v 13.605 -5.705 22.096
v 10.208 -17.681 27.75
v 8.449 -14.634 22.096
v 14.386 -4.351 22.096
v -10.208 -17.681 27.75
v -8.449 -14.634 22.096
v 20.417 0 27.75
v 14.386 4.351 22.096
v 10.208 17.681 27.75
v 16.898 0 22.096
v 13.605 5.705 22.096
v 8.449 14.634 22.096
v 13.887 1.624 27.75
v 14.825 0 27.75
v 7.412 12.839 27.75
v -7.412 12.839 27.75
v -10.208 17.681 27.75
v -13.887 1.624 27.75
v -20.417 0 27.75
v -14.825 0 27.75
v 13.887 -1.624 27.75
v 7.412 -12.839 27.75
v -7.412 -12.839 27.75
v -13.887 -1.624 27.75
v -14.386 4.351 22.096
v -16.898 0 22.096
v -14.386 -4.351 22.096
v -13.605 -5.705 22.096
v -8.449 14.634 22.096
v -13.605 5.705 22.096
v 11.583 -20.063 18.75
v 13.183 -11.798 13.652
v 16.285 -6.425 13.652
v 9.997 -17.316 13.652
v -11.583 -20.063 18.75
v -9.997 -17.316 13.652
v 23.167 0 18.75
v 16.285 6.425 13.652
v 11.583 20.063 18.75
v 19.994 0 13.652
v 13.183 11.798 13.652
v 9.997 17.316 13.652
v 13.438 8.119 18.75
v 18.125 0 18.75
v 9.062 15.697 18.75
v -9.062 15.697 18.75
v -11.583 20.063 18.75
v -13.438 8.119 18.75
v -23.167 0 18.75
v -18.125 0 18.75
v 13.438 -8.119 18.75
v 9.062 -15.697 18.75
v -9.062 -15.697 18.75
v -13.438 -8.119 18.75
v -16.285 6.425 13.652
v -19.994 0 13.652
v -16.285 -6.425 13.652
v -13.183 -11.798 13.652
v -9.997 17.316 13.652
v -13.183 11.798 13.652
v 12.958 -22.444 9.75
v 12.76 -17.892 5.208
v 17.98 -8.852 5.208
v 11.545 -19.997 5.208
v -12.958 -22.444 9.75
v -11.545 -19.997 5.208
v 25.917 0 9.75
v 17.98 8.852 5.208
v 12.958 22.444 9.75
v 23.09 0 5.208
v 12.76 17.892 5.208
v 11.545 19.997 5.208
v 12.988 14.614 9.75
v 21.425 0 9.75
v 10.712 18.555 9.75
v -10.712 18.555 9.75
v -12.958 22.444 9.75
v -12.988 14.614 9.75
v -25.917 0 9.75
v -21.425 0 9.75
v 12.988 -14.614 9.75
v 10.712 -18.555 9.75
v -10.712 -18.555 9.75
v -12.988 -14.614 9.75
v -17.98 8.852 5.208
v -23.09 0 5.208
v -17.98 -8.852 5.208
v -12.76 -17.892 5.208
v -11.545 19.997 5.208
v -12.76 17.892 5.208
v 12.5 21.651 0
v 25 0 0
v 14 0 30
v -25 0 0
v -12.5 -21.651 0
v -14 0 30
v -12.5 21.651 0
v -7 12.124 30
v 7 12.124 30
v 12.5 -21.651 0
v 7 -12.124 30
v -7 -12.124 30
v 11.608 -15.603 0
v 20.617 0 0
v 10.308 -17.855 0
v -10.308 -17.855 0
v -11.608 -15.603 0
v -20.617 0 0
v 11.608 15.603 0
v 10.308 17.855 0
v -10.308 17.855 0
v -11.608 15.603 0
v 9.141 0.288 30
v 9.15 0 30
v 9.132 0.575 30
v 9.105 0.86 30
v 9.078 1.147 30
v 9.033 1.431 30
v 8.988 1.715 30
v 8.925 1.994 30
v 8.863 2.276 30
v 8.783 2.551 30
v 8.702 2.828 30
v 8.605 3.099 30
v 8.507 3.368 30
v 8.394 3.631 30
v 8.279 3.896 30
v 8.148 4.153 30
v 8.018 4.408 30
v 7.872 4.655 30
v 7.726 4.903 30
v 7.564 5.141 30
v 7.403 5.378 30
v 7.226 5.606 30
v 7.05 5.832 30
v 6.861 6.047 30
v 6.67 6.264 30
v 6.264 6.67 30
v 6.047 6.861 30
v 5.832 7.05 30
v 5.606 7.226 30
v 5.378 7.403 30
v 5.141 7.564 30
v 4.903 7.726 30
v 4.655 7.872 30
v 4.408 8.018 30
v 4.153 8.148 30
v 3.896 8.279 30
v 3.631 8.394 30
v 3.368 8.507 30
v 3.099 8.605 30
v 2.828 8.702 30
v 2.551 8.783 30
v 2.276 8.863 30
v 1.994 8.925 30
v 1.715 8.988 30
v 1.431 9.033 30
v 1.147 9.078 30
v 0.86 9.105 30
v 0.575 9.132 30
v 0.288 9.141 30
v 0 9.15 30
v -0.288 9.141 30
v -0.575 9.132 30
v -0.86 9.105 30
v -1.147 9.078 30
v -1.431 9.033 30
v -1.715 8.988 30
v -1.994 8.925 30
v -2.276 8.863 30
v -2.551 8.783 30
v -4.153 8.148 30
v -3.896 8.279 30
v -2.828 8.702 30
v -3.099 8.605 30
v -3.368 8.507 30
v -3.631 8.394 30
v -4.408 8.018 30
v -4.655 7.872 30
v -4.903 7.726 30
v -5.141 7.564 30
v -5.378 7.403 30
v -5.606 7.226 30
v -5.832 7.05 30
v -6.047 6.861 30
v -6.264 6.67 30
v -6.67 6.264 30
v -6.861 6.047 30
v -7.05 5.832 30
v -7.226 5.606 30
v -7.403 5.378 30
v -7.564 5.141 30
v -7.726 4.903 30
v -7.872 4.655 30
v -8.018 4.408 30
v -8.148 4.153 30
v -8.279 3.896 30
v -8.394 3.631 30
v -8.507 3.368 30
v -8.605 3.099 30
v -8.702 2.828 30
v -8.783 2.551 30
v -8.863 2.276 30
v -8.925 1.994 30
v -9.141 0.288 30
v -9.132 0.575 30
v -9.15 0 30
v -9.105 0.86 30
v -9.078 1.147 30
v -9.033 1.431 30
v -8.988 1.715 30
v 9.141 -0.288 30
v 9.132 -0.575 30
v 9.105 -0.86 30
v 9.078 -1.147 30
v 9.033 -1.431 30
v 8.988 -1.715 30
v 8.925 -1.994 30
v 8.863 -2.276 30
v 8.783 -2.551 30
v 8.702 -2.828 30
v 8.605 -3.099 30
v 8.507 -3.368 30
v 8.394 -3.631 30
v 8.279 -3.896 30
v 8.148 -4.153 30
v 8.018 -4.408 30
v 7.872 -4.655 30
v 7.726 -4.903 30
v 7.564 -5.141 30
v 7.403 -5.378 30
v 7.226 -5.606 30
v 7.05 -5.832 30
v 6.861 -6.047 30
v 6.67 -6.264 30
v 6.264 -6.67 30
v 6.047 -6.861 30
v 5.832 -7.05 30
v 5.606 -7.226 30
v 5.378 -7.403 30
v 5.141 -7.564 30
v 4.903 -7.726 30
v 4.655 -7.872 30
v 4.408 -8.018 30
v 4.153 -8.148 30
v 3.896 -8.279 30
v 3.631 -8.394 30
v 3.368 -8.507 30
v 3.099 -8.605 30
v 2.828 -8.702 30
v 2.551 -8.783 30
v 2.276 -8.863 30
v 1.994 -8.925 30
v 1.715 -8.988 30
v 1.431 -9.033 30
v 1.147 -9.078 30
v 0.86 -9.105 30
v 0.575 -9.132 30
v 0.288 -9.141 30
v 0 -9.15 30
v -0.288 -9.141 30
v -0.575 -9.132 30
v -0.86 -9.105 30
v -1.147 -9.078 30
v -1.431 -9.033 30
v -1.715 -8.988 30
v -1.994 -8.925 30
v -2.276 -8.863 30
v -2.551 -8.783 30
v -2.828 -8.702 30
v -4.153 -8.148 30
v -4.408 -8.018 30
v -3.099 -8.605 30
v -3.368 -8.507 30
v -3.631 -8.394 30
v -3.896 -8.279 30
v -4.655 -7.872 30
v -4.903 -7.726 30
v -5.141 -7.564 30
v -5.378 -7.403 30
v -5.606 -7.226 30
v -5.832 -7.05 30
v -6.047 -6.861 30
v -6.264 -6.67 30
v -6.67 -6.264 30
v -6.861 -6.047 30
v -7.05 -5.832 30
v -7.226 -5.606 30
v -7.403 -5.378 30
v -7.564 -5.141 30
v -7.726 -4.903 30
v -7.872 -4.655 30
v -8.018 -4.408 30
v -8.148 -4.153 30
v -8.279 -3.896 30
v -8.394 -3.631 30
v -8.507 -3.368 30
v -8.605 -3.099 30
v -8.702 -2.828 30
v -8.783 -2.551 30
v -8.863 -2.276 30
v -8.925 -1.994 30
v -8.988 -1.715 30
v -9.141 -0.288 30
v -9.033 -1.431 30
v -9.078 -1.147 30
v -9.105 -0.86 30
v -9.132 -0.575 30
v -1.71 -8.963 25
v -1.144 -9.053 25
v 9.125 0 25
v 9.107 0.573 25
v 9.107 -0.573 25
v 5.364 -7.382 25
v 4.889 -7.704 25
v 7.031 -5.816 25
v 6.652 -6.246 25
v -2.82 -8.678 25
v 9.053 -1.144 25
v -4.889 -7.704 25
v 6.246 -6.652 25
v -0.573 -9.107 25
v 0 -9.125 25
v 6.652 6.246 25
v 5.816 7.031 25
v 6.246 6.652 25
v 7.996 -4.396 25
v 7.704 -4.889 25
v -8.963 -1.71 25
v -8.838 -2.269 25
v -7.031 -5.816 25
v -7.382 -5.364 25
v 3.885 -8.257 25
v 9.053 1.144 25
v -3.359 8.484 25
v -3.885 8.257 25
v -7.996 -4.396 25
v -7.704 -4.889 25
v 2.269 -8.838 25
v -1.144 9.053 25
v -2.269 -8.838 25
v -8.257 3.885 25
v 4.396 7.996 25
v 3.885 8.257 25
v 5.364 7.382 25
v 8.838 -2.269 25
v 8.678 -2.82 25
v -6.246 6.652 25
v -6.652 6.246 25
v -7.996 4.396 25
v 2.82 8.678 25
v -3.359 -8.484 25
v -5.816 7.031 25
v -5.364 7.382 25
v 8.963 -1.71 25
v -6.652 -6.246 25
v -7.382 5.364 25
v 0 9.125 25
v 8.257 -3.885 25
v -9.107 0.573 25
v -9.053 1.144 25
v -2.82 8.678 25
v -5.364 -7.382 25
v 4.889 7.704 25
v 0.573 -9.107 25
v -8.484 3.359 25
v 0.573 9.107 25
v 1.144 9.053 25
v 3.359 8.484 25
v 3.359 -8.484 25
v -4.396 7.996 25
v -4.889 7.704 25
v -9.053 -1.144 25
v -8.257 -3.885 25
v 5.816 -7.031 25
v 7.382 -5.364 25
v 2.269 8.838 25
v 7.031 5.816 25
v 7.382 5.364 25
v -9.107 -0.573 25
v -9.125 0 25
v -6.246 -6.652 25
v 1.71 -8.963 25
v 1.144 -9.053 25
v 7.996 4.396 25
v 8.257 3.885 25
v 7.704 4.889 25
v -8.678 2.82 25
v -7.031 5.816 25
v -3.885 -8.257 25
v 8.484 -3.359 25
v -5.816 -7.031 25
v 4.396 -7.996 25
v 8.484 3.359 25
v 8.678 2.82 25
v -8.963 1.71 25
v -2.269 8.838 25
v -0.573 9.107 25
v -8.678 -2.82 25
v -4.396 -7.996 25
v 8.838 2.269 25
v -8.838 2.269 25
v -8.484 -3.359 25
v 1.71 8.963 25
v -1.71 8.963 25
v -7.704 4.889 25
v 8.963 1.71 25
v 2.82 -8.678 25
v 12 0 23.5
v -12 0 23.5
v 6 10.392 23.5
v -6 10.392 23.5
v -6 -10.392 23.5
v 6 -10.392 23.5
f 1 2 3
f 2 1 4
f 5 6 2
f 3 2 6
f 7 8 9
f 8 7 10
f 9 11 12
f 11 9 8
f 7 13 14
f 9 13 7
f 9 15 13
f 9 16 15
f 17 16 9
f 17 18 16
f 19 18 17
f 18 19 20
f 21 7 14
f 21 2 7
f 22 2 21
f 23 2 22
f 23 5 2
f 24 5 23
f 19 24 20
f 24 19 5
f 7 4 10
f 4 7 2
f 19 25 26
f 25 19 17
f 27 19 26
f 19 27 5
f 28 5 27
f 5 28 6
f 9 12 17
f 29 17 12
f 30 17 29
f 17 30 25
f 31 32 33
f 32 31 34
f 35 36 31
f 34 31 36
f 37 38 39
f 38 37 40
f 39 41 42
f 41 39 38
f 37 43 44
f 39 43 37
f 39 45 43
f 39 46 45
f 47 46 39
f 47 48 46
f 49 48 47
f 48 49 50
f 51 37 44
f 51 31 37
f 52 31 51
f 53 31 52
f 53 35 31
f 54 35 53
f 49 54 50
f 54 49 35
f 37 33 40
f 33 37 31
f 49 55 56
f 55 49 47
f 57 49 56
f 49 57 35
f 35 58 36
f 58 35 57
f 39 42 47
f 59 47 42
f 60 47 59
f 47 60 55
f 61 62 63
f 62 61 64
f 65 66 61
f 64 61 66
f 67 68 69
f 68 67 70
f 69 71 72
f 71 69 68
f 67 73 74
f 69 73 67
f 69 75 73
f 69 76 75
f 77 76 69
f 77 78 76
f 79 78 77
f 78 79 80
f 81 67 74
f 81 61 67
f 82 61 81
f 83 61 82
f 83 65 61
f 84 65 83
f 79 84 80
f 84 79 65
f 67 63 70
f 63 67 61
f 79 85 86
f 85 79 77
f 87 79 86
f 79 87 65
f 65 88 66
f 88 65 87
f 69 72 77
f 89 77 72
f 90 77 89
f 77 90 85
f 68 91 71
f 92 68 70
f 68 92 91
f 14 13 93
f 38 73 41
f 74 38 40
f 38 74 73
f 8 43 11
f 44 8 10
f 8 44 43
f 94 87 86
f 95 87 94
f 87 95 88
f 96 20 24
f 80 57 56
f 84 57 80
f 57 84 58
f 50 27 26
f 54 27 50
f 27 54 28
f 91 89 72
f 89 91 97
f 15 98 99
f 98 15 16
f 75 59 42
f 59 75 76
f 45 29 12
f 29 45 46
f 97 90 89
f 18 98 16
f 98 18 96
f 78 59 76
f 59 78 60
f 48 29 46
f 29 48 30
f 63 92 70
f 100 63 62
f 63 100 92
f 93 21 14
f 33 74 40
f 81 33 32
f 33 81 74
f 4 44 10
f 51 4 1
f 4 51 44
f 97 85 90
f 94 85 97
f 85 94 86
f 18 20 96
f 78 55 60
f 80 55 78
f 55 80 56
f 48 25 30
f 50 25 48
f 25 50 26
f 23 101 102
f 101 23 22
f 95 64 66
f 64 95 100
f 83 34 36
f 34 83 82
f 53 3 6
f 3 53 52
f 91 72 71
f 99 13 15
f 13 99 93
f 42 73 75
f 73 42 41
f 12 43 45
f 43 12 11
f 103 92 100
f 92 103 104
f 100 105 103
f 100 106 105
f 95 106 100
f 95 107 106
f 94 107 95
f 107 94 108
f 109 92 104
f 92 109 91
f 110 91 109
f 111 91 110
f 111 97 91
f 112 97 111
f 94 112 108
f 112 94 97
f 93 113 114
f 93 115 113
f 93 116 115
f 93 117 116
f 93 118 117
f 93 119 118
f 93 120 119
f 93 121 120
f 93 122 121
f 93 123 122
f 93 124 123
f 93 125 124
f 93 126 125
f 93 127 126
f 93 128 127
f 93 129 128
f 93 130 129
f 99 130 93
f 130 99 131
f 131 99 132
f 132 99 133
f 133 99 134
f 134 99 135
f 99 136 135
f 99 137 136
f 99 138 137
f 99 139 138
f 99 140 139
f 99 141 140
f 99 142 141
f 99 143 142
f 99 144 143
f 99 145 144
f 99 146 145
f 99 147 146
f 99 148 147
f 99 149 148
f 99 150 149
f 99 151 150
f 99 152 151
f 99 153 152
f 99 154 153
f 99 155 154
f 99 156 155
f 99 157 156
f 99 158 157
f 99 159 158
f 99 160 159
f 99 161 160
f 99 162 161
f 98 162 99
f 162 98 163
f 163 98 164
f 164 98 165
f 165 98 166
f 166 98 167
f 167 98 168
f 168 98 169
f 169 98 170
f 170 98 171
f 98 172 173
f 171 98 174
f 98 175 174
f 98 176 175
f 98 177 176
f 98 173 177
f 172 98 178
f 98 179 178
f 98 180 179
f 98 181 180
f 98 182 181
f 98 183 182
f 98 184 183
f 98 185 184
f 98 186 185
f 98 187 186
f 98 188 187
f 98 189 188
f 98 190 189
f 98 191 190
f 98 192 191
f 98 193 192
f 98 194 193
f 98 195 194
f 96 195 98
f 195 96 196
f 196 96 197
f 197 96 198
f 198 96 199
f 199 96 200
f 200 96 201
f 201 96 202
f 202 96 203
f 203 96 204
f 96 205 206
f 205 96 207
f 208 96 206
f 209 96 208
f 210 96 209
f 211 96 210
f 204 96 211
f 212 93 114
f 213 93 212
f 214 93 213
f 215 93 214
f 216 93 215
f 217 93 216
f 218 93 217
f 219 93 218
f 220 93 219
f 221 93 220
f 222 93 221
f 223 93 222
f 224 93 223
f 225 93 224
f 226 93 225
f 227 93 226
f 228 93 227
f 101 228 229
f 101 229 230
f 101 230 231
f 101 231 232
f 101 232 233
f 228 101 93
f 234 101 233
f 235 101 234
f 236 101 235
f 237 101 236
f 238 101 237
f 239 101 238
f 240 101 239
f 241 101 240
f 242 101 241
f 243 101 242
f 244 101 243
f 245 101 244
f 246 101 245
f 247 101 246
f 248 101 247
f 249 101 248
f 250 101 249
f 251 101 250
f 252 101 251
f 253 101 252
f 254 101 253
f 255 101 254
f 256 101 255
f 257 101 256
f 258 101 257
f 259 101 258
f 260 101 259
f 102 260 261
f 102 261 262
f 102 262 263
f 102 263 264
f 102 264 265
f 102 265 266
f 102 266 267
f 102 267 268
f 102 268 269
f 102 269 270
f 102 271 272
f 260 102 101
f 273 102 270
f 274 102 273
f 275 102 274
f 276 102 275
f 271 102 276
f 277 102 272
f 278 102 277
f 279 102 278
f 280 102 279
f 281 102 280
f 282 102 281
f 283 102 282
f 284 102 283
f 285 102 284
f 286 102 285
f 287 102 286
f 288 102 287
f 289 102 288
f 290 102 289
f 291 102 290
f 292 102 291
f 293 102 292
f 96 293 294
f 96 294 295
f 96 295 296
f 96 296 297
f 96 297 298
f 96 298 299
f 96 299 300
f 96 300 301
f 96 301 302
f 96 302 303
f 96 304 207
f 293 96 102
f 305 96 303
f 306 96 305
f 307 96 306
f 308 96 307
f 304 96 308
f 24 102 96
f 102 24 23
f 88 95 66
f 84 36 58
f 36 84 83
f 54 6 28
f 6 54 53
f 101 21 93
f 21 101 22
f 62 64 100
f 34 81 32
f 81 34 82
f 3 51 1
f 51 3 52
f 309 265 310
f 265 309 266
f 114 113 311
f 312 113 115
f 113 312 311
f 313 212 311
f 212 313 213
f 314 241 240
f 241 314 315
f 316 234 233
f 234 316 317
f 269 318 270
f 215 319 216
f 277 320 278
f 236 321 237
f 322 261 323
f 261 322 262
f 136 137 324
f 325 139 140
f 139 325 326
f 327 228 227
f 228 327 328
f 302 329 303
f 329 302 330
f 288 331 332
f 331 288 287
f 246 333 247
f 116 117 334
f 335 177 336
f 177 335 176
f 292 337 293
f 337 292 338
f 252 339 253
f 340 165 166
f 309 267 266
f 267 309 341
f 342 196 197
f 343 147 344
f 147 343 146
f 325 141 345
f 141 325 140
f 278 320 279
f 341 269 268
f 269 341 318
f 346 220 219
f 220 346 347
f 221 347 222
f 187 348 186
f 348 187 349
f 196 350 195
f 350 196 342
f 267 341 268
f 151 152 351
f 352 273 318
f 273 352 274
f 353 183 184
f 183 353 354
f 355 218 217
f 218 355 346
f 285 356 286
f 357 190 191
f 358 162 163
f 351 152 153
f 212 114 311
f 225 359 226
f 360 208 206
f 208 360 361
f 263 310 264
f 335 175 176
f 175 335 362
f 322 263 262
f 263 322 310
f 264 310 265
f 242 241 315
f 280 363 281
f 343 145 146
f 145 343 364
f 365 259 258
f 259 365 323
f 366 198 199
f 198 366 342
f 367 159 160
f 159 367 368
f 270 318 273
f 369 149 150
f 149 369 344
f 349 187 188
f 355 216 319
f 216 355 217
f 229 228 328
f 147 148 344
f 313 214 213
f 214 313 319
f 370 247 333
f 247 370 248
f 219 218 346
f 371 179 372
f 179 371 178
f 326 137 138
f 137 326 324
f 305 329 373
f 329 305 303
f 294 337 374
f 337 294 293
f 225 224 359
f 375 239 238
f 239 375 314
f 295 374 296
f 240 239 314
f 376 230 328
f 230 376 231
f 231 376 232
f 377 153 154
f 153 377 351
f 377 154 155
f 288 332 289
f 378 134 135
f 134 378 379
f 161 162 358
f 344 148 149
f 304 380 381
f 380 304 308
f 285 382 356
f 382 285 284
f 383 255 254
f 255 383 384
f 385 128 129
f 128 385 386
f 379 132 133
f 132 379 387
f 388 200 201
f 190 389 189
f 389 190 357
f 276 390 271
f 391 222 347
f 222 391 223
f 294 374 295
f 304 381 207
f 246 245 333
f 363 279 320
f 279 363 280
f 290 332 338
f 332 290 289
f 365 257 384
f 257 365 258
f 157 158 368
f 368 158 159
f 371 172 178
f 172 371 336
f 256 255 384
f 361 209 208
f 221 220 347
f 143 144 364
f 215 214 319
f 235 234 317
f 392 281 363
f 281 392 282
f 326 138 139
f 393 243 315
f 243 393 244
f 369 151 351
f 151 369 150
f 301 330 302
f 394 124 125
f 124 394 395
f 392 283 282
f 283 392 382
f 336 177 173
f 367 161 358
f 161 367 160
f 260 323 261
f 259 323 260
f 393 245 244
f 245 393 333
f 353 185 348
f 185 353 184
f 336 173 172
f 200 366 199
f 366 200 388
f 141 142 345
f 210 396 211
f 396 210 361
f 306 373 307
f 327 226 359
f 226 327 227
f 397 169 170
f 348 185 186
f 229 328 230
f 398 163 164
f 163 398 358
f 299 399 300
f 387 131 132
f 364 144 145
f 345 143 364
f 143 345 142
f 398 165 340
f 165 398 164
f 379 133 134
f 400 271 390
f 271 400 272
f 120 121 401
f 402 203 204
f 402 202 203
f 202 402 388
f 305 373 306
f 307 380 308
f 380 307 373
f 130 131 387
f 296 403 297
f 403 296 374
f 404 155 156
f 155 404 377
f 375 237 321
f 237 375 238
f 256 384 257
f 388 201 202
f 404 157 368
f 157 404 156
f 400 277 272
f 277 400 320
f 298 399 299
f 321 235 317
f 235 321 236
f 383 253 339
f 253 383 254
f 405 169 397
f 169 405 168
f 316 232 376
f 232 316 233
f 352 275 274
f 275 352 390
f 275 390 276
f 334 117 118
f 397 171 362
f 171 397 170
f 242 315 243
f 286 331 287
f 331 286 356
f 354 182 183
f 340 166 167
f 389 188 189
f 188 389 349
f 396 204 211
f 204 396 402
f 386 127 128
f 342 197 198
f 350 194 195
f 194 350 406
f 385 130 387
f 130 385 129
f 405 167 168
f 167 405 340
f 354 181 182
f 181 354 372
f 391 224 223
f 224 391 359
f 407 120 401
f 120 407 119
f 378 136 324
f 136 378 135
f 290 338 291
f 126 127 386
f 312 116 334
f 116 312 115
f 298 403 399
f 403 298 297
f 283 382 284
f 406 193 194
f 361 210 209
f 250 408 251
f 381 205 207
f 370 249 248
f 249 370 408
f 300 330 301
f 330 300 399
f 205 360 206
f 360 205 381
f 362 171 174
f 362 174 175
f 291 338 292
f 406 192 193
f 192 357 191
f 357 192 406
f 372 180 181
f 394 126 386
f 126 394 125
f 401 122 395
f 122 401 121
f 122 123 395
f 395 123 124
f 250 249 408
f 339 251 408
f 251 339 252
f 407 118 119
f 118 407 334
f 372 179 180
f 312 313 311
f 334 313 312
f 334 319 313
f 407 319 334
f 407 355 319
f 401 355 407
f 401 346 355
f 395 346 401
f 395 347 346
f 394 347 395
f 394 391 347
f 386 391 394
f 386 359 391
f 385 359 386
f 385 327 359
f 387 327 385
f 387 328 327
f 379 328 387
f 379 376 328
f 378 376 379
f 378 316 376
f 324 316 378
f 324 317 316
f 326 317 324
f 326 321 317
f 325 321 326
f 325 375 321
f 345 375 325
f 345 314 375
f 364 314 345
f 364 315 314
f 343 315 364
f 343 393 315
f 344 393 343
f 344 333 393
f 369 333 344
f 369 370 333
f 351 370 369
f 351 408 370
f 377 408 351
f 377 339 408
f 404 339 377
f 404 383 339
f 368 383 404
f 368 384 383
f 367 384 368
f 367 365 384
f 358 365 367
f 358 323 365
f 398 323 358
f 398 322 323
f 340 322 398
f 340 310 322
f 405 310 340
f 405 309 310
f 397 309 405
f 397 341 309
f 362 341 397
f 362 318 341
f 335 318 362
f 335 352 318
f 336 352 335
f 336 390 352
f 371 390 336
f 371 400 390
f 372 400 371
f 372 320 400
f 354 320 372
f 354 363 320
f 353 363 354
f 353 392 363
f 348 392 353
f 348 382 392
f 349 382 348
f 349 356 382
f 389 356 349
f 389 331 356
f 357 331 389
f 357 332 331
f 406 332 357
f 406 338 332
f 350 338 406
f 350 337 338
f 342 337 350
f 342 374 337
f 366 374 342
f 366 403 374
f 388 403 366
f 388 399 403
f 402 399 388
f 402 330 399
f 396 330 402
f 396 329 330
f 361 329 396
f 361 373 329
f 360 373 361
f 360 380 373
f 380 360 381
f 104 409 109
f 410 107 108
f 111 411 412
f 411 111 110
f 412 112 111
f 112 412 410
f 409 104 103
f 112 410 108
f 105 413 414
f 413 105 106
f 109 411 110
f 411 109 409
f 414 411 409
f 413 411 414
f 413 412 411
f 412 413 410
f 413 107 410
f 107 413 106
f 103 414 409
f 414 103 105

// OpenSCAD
//$fn=6;
//$fn=9;
//$fn=12;
//$fn=24;
//$fn=100;

// Ecken vom Halter - Corners of the holder
halterecken=6; // [3:100]


// Durchmesser des Lochs für die Kerze oben - Diameter of the hole for the candle above
durchmesserkerzeoben=18.35;

// Durchmesser des Lochs für die Kerze unten - Diameter of the hole for the candle below
durchmesserkerzeunten=18.25;

// Tiefe des Lochs für die Kerze - Depth of the hole for the candle
lochkerze=5;

// Durchmesser vom Halter oben - Diameter of the holder above
durchmesserhalteroben=28;

// Durchmesser vom Halter unten - Diameter of the holder below
durchmesserhalterunten=50;

// Höhe vom Halter - Height from holder
halterhoehe=30;

// Ringe - rings ?
halterrige=1; // [1:ja - yes,0:nein - no]


translate([0,0,0]) staender(durchmesserhalterunten,durchmesserhalteroben,halterhoehe,halterrige,halterecken);


/*
translate([0,0,0]) staender(50,25,50,0,16);

translate([0,28,0]) staender(15,25,30,0,32);
translate([28,0,0]) staender(15,25,30,0,32);
translate([-28,0,0]) staender(15,25,30,0,32);
translate([0,-28,0]) staender(15,25,30,0,32);

translate([0,50,0]) staender(45,40,10,1,16);
translate([50,0,0]) staender(45,40,10,1,16);
translate([-50,0,0]) staender(45,40,10,1,16);
translate([0,-50,0]) staender(45,40,10,1,16);
*/
/*
FAV
translate([-50,14,0]) staender(35,25,30,0);
translate([-74,0,0]) staender(35,25,20,0);
translate([-50,-14,0]) staender(35,25,40,0);

translate([0,0,0]) staender(45,30);
*/



/*
translate([-50,14,0]) staender(35,25,30,0);
translate([-74,0,0]) staender(35,25,20,0);
translate([-50,-14,0]) staender(35,25,40,0);


translate([0,0,0]) staender(30);
translate([50,0,0]) staender(35);
translate([50,50,0]) staender(45,30);
translate([0,50,0]) staender(45,35);
translate([50,100,0]) staender(40,30,20,0);
translate([0,100,0]) staender(45,35,20,0);
*/

module staender(unten=30, oben=25, hoehe=20, ringe=1, $fn=6) {
translate([0,0,hoehe/2]) {
color("green") {
difference() {
union() {
cylinder(r1=unten/2,r2=oben/2,h=hoehe,center=true);

if(ringe==1) {
translate([0,0,hoehe*0.3]) cylinder(r1=(((unten-oben)*0.25)+oben)/2-1,r2=(((unten-oben)*0.25)+oben)/2+(unten-oben)/6,h=hoehe/4,center=true);

translate([0,0,0]) cylinder(r1=(((unten-oben)*0.5)+oben)/2-1,r2=(((unten-oben)*0.5)+oben)/2+(unten-oben)/6,h=hoehe/4,center=true);

translate([0,0,-hoehe*0.3]) cylinder(r1=(((unten-oben)*0.75)+oben)/2-1,r2=(((unten-oben)*0.75)+oben)/2+(unten-oben)/6,h=hoehe/4,center=true);
}
}
translate([0,0,hoehe/2]) cylinder(r1=durchmesserkerzeunten/2,r2=durchmesserkerzeoben/2,h=lochkerze*2,center=true,$fn=100);
translate([0,0,-lochkerze-1.5]) cylinder(r1=unten/2-2,r2=oben/2-2,h=hoehe,center=true);
}
}
}
}
